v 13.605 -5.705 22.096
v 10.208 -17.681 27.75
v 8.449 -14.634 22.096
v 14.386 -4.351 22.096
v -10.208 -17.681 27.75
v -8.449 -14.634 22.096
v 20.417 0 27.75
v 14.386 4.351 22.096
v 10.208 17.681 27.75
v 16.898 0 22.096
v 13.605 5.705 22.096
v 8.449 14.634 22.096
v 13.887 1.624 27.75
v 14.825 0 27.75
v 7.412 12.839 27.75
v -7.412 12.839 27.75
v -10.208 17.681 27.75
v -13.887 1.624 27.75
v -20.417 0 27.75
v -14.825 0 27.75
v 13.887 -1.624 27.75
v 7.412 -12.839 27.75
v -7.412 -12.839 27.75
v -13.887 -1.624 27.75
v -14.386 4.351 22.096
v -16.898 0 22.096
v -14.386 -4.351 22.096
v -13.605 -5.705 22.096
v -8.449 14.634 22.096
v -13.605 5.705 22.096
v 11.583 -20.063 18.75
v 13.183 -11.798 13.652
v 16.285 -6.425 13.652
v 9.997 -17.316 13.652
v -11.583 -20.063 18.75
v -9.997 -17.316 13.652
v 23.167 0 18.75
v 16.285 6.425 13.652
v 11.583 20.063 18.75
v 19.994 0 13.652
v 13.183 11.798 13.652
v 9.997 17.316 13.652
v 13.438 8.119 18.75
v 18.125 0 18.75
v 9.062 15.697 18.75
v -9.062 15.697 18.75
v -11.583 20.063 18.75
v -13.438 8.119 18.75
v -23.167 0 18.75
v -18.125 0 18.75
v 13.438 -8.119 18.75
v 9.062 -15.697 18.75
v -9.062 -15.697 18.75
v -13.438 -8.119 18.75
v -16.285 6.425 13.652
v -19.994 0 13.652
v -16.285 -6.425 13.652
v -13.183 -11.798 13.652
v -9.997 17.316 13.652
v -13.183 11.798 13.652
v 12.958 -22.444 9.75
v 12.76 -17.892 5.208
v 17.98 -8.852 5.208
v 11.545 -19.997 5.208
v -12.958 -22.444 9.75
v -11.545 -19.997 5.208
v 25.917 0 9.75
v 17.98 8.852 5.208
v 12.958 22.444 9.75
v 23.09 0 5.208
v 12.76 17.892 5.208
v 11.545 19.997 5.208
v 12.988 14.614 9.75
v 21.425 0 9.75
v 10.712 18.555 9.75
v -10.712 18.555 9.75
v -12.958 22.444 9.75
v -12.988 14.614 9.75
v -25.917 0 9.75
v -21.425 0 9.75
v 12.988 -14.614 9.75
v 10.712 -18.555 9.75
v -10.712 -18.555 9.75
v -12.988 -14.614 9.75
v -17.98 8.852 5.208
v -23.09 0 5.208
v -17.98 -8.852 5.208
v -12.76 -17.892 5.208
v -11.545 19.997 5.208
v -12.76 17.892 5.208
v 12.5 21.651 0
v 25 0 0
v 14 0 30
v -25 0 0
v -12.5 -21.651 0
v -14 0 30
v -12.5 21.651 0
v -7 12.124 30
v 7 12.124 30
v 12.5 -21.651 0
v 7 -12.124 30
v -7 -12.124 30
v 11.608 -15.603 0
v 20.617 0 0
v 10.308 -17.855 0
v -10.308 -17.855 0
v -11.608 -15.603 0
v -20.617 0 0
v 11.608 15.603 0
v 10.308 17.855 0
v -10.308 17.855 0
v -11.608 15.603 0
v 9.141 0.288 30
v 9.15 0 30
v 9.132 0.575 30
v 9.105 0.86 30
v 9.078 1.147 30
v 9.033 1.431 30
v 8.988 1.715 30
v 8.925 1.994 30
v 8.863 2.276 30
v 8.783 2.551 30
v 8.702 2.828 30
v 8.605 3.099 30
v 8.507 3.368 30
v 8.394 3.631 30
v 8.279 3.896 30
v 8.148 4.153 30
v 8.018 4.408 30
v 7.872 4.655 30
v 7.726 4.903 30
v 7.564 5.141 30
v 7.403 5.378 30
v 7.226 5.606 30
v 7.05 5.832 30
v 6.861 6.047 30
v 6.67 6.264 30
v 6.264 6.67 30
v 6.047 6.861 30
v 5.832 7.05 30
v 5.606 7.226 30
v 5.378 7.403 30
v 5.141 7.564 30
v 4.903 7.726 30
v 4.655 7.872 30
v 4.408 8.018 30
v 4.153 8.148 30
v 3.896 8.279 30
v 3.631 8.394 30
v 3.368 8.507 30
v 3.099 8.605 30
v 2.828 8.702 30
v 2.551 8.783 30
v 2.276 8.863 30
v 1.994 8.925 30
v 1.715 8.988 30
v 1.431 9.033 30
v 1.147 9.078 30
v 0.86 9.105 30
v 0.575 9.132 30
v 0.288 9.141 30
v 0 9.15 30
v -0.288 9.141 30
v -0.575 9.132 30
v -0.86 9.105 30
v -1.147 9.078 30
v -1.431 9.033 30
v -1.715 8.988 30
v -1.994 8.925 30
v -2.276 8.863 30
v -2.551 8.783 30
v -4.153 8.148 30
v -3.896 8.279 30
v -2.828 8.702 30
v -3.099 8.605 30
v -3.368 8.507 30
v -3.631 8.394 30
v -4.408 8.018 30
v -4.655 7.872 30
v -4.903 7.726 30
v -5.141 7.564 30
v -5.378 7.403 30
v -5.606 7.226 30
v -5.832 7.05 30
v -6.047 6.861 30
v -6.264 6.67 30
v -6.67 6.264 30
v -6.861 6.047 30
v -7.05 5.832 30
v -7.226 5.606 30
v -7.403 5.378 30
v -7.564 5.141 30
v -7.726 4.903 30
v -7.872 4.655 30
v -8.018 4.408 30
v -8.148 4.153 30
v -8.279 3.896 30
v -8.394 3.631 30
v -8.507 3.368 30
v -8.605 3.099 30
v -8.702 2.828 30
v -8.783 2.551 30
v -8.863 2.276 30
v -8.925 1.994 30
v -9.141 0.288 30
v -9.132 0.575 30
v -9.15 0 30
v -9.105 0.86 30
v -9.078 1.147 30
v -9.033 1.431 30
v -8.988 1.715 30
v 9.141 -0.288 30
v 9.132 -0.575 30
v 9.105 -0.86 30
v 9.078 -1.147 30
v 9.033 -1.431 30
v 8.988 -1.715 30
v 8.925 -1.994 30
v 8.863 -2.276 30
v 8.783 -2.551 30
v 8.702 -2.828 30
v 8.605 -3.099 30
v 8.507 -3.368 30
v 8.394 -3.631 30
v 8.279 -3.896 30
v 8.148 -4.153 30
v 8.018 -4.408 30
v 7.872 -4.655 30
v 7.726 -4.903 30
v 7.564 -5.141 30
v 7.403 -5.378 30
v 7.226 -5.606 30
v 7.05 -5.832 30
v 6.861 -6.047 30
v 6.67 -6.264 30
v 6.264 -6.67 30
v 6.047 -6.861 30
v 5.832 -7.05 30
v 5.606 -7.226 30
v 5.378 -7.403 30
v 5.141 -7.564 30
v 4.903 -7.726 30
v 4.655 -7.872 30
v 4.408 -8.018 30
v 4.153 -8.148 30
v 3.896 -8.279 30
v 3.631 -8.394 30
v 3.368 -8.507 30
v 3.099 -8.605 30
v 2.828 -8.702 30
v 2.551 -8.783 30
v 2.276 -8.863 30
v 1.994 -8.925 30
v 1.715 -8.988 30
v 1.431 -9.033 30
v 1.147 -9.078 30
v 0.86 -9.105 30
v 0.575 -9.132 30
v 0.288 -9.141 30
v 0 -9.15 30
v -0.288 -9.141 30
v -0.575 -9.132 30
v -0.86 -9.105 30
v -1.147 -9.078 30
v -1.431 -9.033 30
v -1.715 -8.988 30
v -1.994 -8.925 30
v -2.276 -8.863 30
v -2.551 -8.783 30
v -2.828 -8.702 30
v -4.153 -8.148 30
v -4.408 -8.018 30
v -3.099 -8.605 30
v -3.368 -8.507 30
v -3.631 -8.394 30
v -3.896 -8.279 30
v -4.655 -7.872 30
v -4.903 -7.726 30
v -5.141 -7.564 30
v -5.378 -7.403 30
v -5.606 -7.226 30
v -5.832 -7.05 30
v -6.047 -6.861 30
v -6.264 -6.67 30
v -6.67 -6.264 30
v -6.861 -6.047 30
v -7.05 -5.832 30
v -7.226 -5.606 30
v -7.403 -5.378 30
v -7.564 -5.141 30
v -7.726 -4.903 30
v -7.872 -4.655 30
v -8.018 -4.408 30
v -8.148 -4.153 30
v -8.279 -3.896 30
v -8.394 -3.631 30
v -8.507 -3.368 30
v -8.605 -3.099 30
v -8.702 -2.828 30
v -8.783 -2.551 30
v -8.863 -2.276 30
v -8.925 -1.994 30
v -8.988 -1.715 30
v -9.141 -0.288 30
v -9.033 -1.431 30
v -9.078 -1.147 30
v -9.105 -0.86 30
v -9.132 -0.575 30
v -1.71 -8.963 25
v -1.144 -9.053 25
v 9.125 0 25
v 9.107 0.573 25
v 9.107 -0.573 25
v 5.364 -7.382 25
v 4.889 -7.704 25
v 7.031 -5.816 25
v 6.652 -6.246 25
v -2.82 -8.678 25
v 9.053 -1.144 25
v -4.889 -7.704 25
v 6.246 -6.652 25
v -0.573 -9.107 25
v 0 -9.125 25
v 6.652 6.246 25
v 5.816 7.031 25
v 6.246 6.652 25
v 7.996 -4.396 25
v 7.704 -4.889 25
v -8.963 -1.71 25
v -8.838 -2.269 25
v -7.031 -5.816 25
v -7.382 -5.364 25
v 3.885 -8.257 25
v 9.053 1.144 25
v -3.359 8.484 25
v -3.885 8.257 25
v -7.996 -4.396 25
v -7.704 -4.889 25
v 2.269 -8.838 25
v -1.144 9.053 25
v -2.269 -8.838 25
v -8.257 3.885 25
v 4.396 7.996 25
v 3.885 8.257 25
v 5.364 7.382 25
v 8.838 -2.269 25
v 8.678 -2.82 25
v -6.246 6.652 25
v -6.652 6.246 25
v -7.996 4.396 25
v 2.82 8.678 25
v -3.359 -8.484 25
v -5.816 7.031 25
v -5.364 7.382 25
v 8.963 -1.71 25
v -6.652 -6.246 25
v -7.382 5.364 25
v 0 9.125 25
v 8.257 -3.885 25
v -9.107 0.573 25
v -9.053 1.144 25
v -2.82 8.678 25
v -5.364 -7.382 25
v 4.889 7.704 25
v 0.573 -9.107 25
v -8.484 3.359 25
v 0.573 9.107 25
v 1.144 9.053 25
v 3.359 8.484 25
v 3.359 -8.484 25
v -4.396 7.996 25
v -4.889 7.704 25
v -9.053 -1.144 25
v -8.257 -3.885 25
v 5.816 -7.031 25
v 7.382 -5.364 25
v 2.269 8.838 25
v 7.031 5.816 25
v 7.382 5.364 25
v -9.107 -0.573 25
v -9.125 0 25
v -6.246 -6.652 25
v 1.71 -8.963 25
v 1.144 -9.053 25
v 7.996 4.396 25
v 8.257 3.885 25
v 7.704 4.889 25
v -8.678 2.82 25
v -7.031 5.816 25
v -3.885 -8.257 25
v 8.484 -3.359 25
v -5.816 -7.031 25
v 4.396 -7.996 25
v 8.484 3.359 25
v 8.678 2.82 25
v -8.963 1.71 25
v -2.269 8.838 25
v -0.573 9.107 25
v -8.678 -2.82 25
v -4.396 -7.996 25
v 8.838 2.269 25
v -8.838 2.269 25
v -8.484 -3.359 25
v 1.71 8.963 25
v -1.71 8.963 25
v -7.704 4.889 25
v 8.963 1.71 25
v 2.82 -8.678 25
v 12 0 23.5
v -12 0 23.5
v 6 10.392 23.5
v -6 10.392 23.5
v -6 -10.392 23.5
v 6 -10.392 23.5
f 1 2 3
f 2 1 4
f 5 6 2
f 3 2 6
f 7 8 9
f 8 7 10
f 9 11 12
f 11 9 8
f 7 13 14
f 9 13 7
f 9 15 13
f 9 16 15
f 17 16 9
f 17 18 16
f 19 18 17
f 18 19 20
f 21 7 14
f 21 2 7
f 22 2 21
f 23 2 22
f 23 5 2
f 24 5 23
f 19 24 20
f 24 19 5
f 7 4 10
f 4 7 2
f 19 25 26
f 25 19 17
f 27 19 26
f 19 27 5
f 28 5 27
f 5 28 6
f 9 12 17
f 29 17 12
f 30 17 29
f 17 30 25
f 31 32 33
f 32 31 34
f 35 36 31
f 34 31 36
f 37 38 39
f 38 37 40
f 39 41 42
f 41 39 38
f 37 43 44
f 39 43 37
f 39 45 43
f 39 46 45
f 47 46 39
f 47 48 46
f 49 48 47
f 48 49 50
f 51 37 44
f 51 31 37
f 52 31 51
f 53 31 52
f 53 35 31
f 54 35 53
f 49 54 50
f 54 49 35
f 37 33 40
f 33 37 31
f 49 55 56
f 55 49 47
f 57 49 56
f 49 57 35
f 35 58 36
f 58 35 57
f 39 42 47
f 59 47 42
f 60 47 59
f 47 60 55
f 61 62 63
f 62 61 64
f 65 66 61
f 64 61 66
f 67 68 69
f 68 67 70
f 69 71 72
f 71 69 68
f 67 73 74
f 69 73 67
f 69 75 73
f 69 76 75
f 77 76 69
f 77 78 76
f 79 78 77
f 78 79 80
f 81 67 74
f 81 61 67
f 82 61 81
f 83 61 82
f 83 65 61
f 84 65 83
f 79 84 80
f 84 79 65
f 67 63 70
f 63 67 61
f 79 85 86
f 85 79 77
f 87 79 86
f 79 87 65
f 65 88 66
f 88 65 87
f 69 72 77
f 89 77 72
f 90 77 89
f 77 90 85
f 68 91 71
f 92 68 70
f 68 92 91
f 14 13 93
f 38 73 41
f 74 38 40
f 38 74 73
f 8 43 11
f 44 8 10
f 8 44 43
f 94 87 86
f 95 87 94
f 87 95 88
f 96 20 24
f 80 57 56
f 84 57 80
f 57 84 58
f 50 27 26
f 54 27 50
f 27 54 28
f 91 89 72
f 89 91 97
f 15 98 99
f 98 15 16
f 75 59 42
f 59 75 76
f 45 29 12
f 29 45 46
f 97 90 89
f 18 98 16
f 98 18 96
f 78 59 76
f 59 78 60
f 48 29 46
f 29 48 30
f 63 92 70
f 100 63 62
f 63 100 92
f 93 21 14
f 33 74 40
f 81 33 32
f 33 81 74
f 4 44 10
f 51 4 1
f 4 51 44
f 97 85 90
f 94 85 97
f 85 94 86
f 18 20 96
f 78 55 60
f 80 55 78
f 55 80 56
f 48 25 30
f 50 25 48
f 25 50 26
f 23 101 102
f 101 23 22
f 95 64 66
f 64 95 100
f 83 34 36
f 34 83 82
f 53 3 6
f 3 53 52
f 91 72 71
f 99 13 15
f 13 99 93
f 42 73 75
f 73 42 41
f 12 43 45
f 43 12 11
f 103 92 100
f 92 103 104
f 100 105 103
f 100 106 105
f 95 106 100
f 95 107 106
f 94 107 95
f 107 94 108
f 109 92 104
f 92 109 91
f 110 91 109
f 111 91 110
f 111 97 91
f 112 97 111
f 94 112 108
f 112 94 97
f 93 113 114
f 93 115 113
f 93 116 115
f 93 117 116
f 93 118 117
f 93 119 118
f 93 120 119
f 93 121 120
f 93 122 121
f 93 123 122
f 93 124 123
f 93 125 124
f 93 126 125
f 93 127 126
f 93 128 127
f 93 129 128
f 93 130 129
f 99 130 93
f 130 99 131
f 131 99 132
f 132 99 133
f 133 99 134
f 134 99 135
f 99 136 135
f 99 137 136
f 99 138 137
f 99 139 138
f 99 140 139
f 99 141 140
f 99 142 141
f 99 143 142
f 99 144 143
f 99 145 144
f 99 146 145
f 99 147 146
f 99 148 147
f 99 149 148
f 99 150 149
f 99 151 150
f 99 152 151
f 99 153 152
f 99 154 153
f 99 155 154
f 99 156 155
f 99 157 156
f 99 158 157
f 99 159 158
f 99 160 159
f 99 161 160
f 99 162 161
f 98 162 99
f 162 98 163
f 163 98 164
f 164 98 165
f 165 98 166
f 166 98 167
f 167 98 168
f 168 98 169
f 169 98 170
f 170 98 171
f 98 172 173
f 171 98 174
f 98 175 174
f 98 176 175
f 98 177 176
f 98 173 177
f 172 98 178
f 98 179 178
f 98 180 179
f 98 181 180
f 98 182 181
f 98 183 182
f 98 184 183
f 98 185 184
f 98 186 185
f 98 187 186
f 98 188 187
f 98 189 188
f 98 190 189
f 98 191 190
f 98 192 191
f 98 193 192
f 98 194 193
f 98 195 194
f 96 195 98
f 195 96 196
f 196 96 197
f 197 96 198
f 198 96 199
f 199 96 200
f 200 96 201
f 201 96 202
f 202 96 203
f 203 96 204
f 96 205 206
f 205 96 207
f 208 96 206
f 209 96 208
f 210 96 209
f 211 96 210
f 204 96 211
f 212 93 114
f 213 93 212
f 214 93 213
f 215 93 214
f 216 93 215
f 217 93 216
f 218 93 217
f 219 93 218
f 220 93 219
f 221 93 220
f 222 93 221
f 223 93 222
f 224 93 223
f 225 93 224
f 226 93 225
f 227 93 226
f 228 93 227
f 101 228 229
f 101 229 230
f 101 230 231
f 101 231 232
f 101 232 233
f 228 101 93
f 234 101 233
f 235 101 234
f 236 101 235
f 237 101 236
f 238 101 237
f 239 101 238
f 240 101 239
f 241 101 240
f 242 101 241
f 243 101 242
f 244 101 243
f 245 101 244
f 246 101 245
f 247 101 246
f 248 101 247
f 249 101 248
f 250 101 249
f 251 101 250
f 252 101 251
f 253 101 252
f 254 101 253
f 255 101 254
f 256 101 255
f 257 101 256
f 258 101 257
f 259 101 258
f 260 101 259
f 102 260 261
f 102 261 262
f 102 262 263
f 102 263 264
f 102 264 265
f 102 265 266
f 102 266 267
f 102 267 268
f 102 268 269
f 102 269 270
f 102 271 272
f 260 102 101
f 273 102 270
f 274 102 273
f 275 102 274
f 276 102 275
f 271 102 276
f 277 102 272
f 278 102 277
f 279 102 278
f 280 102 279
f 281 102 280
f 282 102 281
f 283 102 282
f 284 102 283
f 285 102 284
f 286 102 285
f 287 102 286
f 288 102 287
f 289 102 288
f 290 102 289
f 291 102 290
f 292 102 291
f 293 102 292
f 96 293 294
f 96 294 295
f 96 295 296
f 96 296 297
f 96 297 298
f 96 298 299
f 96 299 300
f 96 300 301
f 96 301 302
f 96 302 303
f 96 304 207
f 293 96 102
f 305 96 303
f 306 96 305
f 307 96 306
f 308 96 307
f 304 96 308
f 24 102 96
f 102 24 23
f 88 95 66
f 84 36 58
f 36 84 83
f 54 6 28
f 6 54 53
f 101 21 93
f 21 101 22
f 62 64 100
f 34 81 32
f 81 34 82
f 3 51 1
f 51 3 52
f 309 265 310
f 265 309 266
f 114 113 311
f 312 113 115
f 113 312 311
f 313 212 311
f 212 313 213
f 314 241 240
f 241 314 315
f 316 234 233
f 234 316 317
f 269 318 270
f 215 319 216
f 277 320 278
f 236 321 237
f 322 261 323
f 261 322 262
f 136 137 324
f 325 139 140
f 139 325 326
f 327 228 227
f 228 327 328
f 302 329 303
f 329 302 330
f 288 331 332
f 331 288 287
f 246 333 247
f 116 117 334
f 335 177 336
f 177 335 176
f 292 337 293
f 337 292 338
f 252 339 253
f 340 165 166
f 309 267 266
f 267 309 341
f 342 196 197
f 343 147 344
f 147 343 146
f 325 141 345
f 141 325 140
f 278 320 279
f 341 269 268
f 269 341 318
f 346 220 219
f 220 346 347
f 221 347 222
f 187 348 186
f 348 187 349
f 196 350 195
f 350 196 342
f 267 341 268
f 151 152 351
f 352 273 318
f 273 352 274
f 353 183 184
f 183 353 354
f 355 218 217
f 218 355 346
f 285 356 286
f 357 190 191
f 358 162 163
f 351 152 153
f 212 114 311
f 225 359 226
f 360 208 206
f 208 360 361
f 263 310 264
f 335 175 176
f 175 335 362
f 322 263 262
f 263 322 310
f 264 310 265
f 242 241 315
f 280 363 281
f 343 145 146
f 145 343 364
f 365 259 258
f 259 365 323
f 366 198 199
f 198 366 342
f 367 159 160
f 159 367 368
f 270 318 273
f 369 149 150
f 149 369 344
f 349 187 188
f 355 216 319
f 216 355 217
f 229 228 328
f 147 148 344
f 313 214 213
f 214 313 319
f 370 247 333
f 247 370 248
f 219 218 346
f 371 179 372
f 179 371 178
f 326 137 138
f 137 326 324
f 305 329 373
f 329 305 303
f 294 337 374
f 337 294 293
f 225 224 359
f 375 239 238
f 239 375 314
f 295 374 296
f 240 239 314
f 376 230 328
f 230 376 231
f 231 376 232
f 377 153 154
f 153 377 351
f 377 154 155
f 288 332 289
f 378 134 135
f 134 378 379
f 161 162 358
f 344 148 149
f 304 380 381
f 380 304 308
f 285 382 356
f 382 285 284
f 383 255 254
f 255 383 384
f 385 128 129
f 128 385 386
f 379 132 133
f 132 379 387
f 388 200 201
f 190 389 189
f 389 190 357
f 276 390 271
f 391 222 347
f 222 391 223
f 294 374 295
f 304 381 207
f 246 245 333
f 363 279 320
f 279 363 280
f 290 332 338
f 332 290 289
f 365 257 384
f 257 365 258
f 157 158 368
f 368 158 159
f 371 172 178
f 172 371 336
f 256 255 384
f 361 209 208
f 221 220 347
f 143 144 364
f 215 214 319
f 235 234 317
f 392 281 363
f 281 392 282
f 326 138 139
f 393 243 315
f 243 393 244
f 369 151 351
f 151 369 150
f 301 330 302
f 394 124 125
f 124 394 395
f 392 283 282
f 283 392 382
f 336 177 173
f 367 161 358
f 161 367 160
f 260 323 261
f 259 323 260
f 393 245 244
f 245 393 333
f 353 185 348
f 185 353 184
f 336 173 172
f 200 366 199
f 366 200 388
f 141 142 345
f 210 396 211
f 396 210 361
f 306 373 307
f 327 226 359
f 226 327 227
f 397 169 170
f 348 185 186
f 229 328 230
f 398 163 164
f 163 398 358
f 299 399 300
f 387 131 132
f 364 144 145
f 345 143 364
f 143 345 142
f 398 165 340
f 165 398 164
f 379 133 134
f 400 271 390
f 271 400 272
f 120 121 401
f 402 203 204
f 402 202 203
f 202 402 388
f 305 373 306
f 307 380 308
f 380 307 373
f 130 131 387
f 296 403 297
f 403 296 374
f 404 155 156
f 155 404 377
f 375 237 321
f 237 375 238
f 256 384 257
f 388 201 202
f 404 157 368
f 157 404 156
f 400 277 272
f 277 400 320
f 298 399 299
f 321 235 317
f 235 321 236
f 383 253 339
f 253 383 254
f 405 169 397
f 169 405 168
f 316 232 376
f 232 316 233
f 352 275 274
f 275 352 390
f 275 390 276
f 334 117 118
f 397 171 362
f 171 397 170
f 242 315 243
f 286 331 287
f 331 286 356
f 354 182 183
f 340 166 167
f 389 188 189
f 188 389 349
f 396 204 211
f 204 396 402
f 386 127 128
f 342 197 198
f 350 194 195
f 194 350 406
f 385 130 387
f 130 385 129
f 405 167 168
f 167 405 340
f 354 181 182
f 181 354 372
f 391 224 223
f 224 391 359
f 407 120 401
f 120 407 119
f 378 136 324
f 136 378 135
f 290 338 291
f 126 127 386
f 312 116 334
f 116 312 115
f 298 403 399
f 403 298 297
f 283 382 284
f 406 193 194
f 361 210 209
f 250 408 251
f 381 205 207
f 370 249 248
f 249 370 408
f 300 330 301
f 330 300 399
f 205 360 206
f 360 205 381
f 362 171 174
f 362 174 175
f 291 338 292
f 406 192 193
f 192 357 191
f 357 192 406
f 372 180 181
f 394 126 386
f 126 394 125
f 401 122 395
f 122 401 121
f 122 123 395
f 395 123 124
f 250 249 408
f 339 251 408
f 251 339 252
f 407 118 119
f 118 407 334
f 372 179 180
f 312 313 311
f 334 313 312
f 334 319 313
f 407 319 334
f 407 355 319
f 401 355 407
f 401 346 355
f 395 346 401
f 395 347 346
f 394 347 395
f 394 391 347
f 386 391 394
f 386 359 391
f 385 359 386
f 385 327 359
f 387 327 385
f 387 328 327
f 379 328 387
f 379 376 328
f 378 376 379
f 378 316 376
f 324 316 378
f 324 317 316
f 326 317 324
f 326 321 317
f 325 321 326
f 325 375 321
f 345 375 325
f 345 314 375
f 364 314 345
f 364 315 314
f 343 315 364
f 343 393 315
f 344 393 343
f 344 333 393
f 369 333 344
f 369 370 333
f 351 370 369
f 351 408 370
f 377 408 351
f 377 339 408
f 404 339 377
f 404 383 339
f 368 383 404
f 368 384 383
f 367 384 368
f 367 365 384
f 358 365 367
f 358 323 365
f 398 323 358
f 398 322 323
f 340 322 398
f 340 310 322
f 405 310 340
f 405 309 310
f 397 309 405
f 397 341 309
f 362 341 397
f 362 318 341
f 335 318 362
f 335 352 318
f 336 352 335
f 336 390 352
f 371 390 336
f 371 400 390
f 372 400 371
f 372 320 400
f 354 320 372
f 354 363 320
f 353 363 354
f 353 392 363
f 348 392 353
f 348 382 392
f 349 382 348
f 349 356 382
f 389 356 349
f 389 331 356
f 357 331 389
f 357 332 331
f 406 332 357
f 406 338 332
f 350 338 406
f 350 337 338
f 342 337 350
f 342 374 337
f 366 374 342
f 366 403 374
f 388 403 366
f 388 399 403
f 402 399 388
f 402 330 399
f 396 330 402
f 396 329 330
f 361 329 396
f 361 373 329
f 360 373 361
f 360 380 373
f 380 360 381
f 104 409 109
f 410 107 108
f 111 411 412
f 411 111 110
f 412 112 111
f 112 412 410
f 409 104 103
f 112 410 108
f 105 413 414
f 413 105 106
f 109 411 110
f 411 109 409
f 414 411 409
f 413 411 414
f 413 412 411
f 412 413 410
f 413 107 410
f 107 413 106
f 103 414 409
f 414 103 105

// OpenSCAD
//$fn=6;
//$fn=9;
//$fn=12;
//$fn=24;
//$fn=100;

// Ecken vom Halter - Corners of the holder
halterecken=6; // [3:100]


// Durchmesser des Lochs für die Kerze oben - Diameter of the hole for the candle above
durchmesserkerzeoben=18.35;

// Durchmesser des Lochs für die Kerze unten - Diameter of the hole for the candle below
durchmesserkerzeunten=18.25;

// Tiefe des Lochs für die Kerze - Depth of the hole for the candle
lochkerze=5;

// Durchmesser vom Halter oben - Diameter of the holder above
durchmesserhalteroben=28;

// Durchmesser vom Halter unten - Diameter of the holder below
durchmesserhalterunten=50;

// Höhe vom Halter - Height from holder
halterhoehe=30;

// Ringe - rings ?
halterrige=1; // [1:ja - yes,0:nein - no]


translate([0,0,0]) staender(durchmesserhalterunten,durchmesserhalteroben,halterhoehe,halterrige,halterecken);


/*
translate([0,0,0]) staender(50,25,50,0,16);

translate([0,28,0]) staender(15,25,30,0,32);
translate([28,0,0]) staender(15,25,30,0,32);
translate([-28,0,0]) staender(15,25,30,0,32);
translate([0,-28,0]) staender(15,25,30,0,32);

translate([0,50,0]) staender(45,40,10,1,16);
translate([50,0,0]) staender(45,40,10,1,16);
translate([-50,0,0]) staender(45,40,10,1,16);
translate([0,-50,0]) staender(45,40,10,1,16);
*/
/*
FAV
translate([-50,14,0]) staender(35,25,30,0);
translate([-74,0,0]) staender(35,25,20,0);
translate([-50,-14,0]) staender(35,25,40,0);

translate([0,0,0]) staender(45,30);
*/



/*
translate([-50,14,0]) staender(35,25,30,0);
translate([-74,0,0]) staender(35,25,20,0);
translate([-50,-14,0]) staender(35,25,40,0);


translate([0,0,0]) staender(30);
translate([50,0,0]) staender(35);
translate([50,50,0]) staender(45,30);
translate([0,50,0]) staender(45,35);
translate([50,100,0]) staender(40,30,20,0);
translate([0,100,0]) staender(45,35,20,0);
*/

module staender(unten=30, oben=25, hoehe=20, ringe=1, $fn=6) {
translate([0,0,hoehe/2]) {
color("green") {
difference() {
union() {
cylinder(r1=unten/2,r2=oben/2,h=hoehe,center=true);

if(ringe==1) {
translate([0,0,hoehe*0.3]) cylinder(r1=(((unten-oben)*0.25)+oben)/2-1,r2=(((unten-oben)*0.25)+oben)/2+(unten-oben)/6,h=hoehe/4,center=true);

translate([0,0,0]) cylinder(r1=(((unten-oben)*0.5)+oben)/2-1,r2=(((unten-oben)*0.5)+oben)/2+(unten-oben)/6,h=hoehe/4,center=true);

translate([0,0,-hoehe*0.3]) cylinder(r1=(((unten-oben)*0.75)+oben)/2-1,r2=(((unten-oben)*0.75)+oben)/2+(unten-oben)/6,h=hoehe/4,center=true);
}
}
translate([0,0,hoehe/2]) cylinder(r1=durchmesserkerzeunten/2,r2=durchmesserkerzeoben/2,h=lochkerze*2,center=true,$fn=100);
translate([0,0,-lochkerze-1.5]) cylinder(r1=unten/2-2,r2=oben/2-2,h=hoehe,center=true);
}
}
}
}
